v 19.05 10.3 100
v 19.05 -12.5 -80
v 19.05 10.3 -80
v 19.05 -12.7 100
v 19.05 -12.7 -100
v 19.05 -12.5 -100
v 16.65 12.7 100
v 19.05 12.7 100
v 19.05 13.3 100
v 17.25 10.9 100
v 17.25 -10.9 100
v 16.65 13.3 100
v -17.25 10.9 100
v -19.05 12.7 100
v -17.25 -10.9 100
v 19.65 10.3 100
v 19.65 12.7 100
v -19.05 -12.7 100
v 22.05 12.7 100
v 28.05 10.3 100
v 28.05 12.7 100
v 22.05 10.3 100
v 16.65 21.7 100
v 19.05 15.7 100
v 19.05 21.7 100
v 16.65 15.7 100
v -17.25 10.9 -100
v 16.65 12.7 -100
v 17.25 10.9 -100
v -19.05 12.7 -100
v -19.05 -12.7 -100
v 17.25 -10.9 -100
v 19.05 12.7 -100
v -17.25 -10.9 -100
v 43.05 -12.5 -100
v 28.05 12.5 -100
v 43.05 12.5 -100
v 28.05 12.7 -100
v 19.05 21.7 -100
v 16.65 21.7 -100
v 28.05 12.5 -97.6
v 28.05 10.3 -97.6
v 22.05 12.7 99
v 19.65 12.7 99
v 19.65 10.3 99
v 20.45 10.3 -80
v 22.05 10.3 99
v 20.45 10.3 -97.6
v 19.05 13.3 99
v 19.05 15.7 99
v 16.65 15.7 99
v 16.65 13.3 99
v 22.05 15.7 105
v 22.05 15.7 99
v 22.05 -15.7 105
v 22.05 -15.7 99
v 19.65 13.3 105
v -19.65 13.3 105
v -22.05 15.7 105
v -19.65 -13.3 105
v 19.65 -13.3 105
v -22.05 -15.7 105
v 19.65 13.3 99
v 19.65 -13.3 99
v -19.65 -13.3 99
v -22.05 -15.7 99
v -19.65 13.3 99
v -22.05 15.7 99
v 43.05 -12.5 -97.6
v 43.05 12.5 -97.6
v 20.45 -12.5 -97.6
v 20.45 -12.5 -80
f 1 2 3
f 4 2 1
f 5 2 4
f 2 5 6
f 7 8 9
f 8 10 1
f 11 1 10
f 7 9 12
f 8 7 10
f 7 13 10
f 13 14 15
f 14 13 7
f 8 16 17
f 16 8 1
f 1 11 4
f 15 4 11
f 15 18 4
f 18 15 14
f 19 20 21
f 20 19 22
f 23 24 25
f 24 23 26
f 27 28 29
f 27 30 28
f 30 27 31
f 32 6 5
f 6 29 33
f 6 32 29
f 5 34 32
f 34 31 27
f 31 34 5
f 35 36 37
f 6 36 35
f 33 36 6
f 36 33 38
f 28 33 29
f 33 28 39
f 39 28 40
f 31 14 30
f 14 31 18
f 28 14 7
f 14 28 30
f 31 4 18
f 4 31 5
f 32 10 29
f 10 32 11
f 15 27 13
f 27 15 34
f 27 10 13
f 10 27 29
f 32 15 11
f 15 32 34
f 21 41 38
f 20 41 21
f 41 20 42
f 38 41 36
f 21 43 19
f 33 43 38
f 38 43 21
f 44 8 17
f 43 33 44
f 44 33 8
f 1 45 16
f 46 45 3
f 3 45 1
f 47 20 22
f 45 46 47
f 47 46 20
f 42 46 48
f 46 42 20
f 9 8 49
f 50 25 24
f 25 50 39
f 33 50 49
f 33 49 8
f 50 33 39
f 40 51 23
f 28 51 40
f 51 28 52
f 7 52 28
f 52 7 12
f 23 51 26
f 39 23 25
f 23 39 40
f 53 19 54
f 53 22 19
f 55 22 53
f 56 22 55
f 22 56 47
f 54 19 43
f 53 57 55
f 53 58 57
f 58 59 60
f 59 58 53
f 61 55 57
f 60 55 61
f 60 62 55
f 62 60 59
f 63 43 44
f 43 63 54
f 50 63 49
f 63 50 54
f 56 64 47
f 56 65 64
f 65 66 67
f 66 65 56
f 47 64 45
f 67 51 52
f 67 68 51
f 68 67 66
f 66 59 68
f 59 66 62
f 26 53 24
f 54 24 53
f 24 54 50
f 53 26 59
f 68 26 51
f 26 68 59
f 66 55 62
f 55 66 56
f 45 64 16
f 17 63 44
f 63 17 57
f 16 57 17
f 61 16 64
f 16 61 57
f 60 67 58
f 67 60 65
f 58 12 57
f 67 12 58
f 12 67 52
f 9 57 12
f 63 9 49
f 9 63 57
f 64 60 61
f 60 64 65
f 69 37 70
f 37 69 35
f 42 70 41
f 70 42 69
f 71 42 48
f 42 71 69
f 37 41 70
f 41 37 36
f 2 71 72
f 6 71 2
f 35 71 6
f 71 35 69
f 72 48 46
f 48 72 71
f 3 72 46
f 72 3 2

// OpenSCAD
// Parameters
outer_width = 38.1; //[19.05:76.2:0.1]
outer_height = 25.4; //[12.7:50.8:0.1]
wall_thickness = 1.6; //[0.8:3.2:0.1]
length = 200; //[20:1000:1]
eps_overlap = 1; //[0.5:2:0.1]
void_clearance = 0.2; //[0:0.6:0.05]
profile_thickness = 2.4; //[1.2:6:0.1]
profile_leg = 10; //[5:25:0.5]
bezel_depth = 6; //[2:20:0.5]
bezel_outset = 3; //[1:10:0.5]
bracket_width = 25; //[12.5:60:0.5]
bracket_height = 25; //[12.5:60:0.5]
bracket_depth = 20; //[10:80:1]

// Box Section
module box_section() {
  color("Silver") difference() {
    cube([outer_width, outer_height, length], center=true);
    translate([0, 0, 0])
      cube([outer_width - 2*(wall_thickness + void_clearance), 
            outer_height - 2*(wall_thickness + void_clearance), 
            length + 2*eps_overlap], center=true);
  }
}

// Box Corner Profile Section
module box_corner_profile_section() {
  color("DimGray") union() {
    translate([outer_width/2 + profile_leg/2 - eps_overlap, 
               outer_height/2 - profile_thickness/2, 0])
      cube([profile_leg, profile_thickness, length], center=true);
    translate([outer_width/2 - profile_thickness/2, 
               outer_height/2 + profile_leg/2 - eps_overlap, 0])
      cube([profile_thickness, profile_leg, length], center=true);
  }
}

// Box Bezel Section
module box_bezel_section() {
  color("Black") difference() {
    translate([0, 0, length/2 + bezel_depth/2 - eps_overlap])
      cube([outer_width + 2*bezel_outset, 
            outer_height + 2*bezel_outset, 
            bezel_depth], center=true);
    translate([0, 0, length/2 + bezel_depth/2 - eps_overlap])
      cube([outer_width + 2*(bezel_outset - profile_thickness), 
            outer_height + 2*(bezel_outset - profile_thickness), 
            bezel_depth + 2*eps_overlap], center=true);
  }
}

// Box Corner Profile Sections
module box_corner_profile_sections() {
  union() {
    box_section();
    box_corner_profile_section();
  }
}

// Box Shelf Bracket Section
module box_shelf_bracket_section() {
  color("Silver") union() {
    translate([outer_width/2 + bracket_width/2 - eps_overlap, 0, -length/2 + profile_thickness/2])
      cube([bracket_width, bracket_height, profile_thickness], center=true);
    translate([outer_width/2 + profile_thickness/2 - eps_overlap, 0, -length/2 + bracket_depth/2])
      cube([profile_thickness, bracket_height, bracket_depth], center=true);
  }
}

// Assembly
module assembly() {
  union() {
    box_corner_profile_sections();
    box_bezel_section();
    box_shelf_bracket_section();
  }
}

assembly();
